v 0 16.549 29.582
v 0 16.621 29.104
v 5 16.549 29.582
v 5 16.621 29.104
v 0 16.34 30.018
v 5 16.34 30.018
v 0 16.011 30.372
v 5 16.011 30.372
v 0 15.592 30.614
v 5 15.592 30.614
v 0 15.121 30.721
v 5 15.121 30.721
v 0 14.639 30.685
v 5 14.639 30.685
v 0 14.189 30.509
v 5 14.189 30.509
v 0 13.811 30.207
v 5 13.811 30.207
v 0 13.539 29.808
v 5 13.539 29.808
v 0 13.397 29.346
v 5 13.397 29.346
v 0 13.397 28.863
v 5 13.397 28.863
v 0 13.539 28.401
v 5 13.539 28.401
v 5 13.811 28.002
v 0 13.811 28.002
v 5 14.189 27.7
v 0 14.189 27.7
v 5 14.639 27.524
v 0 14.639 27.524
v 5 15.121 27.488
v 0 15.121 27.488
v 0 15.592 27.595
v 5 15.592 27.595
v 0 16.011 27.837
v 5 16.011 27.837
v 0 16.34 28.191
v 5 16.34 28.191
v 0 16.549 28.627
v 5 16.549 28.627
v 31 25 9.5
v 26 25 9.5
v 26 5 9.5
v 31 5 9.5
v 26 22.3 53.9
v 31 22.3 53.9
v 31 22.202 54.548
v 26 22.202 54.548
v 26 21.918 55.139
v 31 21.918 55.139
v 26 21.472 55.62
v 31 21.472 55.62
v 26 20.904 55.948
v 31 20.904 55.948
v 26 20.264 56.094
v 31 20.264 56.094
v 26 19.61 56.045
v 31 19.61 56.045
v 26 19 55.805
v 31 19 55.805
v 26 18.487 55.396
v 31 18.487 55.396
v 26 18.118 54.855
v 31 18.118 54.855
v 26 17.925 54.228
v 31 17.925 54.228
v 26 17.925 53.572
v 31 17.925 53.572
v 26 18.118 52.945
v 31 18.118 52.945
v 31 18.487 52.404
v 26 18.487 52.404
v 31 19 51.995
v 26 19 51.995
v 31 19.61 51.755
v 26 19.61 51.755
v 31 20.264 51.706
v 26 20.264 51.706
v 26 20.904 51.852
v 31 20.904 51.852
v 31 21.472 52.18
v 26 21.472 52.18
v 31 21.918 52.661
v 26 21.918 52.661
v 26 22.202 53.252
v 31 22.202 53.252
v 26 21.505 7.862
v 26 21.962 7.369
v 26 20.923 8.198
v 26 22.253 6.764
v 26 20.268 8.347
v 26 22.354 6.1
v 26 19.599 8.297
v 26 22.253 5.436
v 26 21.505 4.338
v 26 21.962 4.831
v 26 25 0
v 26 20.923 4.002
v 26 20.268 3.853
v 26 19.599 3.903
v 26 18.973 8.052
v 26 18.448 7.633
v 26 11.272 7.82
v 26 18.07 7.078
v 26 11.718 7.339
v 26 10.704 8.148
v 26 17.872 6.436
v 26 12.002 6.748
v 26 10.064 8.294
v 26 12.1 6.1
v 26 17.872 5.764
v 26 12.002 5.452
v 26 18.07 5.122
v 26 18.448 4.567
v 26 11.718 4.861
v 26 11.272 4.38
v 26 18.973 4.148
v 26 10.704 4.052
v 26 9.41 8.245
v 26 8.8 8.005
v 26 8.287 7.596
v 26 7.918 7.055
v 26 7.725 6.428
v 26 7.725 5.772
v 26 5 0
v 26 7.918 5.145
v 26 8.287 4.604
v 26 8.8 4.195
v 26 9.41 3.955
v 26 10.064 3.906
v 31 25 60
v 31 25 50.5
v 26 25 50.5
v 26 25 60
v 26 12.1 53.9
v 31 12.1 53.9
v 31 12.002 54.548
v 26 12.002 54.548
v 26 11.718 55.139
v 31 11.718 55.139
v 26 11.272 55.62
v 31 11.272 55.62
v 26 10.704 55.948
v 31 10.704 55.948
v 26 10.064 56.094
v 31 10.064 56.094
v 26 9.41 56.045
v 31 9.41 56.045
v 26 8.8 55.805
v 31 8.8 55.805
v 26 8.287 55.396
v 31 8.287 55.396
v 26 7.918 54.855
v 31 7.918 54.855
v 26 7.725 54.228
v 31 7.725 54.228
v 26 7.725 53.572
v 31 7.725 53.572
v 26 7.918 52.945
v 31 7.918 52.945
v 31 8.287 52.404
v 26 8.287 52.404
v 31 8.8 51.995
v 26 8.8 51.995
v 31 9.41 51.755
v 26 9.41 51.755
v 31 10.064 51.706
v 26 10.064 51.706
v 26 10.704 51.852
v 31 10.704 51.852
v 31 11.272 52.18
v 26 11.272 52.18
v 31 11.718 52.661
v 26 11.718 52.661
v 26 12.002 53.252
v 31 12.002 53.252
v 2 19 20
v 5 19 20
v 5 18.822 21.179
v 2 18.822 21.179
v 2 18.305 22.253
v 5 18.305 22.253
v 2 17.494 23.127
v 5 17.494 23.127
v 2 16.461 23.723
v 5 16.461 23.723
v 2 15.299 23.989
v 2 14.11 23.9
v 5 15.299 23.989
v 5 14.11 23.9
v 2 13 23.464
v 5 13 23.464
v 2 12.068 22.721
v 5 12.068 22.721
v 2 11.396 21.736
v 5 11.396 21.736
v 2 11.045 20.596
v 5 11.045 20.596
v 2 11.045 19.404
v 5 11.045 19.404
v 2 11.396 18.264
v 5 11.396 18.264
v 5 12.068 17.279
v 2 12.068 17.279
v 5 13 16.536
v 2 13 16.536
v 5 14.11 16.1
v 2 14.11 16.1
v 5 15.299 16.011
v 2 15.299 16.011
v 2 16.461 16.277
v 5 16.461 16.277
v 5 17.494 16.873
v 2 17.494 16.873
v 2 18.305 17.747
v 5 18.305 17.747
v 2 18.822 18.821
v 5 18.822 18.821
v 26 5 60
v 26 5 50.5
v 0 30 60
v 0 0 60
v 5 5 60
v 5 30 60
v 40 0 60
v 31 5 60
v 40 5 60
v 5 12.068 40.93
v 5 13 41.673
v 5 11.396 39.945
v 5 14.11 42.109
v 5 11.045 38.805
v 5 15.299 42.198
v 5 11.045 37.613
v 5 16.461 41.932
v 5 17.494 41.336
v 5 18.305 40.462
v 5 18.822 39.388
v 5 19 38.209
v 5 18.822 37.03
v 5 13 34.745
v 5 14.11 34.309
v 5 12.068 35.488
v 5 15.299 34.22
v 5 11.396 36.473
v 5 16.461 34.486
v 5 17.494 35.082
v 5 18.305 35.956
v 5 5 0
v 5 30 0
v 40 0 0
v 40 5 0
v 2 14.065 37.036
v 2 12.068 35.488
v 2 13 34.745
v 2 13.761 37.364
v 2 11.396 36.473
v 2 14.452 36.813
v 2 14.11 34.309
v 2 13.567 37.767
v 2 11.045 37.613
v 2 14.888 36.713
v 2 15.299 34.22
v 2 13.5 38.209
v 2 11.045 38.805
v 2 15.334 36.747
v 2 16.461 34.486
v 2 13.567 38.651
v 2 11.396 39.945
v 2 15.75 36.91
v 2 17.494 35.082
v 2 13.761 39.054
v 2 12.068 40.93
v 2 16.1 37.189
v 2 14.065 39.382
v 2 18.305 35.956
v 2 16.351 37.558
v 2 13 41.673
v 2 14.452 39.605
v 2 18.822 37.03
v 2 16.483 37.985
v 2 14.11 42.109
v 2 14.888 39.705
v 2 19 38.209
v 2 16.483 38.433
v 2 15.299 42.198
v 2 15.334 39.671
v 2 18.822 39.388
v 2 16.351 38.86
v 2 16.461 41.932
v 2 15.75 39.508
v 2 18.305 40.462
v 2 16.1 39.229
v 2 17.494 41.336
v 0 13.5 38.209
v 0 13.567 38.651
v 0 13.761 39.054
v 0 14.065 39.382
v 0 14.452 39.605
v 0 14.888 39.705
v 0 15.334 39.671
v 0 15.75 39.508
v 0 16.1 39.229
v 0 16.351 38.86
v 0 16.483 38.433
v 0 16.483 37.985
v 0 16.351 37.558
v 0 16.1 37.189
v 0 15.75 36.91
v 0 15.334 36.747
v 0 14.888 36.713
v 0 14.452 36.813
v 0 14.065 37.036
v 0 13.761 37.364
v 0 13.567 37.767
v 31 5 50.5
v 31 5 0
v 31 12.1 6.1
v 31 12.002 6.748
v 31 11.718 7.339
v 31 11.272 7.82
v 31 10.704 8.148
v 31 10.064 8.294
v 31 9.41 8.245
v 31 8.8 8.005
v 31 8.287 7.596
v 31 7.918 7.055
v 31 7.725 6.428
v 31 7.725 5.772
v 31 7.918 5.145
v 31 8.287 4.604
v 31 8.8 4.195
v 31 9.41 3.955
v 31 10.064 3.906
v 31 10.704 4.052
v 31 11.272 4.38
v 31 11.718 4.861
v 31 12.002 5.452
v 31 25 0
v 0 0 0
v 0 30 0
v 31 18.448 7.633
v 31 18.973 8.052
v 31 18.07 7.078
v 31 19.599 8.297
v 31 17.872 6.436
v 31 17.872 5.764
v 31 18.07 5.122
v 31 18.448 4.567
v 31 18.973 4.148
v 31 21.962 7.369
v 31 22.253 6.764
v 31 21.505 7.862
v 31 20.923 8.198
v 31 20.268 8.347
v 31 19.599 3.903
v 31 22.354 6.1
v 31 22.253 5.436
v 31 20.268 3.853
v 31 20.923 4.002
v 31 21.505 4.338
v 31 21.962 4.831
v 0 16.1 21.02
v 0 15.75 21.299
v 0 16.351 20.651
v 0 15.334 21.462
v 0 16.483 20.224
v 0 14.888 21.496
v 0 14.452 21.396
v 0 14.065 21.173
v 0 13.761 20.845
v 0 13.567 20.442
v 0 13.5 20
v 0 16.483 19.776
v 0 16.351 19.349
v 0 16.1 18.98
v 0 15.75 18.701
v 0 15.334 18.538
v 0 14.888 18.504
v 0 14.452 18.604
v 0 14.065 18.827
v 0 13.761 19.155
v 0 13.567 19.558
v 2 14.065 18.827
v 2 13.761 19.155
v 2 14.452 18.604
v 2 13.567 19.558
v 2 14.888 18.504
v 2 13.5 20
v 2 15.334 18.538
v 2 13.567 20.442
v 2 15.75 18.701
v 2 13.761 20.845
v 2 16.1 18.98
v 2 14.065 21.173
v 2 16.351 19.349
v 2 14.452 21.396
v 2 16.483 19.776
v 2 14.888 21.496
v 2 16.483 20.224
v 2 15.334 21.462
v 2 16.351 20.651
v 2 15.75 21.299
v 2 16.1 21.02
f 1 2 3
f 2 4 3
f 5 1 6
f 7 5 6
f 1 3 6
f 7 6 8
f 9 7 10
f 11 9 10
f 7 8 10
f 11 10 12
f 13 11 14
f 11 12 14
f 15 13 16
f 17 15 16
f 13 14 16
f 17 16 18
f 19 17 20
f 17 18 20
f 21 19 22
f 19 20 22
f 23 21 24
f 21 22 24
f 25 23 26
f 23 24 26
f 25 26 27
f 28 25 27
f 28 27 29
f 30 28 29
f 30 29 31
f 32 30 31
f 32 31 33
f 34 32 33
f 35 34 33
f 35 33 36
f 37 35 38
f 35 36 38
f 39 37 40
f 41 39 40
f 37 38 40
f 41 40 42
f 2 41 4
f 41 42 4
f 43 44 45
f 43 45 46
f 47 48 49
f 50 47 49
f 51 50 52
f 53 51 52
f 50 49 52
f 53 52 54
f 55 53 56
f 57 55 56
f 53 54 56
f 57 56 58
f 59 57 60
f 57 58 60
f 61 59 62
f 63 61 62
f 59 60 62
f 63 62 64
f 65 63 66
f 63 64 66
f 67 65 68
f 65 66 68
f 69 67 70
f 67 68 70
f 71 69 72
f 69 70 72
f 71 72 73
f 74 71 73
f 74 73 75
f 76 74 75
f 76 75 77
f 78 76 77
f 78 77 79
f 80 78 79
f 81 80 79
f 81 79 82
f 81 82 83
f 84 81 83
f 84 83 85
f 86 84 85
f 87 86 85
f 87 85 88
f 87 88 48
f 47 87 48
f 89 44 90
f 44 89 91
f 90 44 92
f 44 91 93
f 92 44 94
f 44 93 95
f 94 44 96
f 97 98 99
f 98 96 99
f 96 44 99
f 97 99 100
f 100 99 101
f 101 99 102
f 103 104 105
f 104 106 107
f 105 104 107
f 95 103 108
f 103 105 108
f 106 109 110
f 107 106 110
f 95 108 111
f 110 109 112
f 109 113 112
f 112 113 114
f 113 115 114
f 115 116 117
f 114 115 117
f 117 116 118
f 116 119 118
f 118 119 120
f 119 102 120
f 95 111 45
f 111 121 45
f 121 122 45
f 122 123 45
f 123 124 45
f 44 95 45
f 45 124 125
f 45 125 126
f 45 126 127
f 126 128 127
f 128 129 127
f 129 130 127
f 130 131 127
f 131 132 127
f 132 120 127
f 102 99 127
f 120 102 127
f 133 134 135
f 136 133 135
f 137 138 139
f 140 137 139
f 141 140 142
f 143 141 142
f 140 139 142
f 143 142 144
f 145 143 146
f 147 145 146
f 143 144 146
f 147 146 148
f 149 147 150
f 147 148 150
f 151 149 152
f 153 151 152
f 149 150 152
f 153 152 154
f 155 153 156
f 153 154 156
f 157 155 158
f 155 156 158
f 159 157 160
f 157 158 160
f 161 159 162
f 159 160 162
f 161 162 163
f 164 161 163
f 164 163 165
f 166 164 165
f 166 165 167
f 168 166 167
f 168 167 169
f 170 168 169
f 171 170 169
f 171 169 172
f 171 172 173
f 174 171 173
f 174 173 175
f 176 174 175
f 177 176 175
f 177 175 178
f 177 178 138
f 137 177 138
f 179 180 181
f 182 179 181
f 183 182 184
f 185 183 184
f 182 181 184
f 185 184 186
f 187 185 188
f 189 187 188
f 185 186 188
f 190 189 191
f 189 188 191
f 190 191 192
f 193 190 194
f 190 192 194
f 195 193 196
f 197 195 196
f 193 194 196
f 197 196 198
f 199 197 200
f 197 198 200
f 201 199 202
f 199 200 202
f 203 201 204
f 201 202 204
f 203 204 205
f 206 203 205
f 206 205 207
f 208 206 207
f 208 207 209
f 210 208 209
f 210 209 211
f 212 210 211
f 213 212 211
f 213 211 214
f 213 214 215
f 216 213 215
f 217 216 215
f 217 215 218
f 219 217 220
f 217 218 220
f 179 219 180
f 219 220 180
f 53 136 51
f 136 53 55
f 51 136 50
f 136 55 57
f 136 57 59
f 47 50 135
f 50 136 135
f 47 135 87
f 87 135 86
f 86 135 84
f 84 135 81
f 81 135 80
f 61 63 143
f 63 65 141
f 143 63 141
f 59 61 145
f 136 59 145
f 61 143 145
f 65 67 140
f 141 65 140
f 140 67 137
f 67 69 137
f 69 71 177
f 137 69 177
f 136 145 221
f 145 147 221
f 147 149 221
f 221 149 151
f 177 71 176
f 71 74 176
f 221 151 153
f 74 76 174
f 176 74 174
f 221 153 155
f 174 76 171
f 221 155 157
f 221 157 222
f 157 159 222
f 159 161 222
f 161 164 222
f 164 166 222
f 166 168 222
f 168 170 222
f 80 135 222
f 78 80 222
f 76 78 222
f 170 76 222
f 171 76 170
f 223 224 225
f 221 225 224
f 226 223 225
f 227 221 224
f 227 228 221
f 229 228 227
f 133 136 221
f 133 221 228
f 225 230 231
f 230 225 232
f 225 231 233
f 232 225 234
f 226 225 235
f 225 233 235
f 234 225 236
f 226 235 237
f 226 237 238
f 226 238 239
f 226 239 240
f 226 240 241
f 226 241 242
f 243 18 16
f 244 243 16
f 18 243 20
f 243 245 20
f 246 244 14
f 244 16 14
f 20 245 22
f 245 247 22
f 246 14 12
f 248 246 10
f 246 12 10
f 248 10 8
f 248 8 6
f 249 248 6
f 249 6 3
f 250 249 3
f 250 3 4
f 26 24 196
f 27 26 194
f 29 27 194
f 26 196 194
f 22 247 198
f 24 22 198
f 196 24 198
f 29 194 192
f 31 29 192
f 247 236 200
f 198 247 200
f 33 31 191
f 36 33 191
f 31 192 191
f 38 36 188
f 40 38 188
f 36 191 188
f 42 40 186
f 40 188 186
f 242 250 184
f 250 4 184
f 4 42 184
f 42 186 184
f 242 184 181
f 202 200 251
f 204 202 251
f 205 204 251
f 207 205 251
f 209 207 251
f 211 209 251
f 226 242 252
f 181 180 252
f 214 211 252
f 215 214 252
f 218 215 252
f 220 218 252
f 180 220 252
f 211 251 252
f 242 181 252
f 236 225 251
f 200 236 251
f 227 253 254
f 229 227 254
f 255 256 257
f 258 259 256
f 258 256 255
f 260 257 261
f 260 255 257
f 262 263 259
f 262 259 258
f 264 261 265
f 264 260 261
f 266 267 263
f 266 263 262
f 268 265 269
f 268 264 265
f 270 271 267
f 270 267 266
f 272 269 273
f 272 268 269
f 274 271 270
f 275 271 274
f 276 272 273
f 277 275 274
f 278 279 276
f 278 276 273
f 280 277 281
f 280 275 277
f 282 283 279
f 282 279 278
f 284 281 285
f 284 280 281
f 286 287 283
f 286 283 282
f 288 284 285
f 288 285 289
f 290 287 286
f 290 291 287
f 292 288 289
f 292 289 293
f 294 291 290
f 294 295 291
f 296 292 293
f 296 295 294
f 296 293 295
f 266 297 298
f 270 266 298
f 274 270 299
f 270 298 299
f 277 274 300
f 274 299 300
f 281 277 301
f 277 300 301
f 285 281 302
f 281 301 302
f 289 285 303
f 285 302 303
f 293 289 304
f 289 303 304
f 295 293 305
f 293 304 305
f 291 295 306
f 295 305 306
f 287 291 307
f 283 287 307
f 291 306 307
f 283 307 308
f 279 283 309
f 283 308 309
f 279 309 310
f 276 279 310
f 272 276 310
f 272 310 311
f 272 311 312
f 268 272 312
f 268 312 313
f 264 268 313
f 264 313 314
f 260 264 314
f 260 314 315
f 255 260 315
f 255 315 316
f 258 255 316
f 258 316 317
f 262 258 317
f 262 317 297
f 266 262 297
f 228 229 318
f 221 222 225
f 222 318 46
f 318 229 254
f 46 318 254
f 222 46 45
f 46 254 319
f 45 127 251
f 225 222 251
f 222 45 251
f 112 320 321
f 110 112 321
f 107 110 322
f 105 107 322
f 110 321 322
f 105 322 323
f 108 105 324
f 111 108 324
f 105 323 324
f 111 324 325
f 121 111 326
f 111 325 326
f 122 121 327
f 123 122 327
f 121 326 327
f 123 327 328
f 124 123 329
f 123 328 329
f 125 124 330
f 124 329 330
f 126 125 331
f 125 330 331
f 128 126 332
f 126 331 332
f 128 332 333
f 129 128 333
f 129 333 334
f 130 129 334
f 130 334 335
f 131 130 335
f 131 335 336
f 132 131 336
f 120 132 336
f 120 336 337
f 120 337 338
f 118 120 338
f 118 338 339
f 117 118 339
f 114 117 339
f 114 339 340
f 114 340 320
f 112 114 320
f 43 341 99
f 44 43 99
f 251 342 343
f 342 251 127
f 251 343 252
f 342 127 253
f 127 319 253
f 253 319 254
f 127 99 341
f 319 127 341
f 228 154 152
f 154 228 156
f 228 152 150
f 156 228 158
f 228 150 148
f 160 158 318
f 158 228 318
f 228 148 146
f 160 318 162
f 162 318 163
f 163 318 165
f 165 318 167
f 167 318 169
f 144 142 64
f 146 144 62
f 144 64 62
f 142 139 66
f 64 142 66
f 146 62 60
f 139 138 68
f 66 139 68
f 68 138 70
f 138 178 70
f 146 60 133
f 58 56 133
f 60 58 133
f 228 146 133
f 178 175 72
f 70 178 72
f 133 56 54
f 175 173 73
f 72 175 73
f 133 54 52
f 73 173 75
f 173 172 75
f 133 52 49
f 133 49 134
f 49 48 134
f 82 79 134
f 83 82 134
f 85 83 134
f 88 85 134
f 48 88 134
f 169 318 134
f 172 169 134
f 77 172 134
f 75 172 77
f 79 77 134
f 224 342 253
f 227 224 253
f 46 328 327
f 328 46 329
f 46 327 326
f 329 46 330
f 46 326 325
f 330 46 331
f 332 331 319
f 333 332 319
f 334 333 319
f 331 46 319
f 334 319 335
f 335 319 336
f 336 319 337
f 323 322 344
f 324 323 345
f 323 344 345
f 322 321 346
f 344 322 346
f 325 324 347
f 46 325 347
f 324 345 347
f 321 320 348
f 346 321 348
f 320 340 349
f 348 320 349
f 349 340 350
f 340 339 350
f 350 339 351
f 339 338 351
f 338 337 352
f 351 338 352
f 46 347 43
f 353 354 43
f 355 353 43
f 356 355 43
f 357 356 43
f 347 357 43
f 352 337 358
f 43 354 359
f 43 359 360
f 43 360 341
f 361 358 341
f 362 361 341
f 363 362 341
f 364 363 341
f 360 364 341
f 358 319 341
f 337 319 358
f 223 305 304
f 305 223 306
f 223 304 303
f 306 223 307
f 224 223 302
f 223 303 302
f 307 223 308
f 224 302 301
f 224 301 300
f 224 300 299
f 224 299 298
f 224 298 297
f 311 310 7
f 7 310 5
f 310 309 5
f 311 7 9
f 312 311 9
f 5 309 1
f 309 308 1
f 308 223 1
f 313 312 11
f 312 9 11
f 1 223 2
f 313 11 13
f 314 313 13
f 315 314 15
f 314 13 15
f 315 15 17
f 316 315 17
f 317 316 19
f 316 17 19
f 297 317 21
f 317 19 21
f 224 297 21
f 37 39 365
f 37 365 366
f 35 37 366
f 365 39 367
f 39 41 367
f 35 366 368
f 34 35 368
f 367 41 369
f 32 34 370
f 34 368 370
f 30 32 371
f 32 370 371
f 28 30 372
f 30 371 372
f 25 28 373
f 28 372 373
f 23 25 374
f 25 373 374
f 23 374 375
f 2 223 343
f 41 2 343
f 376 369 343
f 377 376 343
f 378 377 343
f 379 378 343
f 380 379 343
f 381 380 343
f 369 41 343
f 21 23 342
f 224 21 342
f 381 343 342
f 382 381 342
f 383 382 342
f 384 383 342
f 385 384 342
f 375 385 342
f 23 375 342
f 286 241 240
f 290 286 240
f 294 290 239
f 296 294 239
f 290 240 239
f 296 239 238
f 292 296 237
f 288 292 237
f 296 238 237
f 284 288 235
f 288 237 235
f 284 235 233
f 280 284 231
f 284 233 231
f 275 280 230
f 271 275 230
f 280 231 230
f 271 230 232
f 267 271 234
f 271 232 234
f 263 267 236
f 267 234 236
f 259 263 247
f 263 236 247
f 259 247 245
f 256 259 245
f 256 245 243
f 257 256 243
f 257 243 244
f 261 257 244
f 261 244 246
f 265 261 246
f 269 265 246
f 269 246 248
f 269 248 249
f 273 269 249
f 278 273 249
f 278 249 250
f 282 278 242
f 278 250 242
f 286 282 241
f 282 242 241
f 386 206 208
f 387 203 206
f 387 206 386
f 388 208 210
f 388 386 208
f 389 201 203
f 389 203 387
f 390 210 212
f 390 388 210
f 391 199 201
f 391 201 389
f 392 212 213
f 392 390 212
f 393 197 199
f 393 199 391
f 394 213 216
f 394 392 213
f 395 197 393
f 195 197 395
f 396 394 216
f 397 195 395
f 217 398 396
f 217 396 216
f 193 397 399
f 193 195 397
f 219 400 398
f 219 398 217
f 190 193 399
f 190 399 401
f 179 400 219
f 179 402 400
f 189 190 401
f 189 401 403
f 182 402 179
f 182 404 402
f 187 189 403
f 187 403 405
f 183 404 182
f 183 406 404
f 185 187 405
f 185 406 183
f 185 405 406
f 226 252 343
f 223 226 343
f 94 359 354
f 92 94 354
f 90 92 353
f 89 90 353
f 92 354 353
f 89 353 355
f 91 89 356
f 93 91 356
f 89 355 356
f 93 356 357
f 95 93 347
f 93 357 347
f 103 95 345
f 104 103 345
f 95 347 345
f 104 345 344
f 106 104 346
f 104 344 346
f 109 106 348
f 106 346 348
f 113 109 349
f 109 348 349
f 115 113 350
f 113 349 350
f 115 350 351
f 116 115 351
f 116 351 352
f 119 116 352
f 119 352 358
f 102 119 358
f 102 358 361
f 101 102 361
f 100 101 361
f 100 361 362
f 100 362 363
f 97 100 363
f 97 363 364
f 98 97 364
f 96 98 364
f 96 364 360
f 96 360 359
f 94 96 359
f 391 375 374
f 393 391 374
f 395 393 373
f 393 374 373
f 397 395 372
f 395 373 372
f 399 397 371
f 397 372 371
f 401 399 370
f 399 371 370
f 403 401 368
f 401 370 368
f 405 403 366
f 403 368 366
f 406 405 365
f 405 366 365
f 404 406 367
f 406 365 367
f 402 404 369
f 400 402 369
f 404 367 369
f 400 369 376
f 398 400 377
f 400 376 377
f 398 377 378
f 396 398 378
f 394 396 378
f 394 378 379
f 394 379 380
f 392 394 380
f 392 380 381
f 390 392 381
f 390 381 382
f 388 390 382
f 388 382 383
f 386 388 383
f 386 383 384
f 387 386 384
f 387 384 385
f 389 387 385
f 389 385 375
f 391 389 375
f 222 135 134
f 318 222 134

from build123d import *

# Parameters (mm, degrees)
SALIENTE_EXTRUIR1_DEPTH = 60
CROQUIS2_W              = 5
CROQUIS2_H              = 41
CORTAR_EXTRUIR1_DEPTH   = 20
CROQUIS7_R              = 2.2
CROQUIS7_R_2            = 2.253524607
CORTAR_EXTRUIR5_DEPTH   = 10
CROQUIS8_R              = 1.5
CORTAR_EXTRUIR6_DEPTH   = 10
CROQUIS9_R              = 4
CROQUIS9_R_2            = 1.621314805
CORTAR_EXTRUIR7_DEPTH   = 3
CROQUIS10_R             = 1.621314805
CORTAR_EXTRUIR8_DEPTH   = 10


with BuildPart() as part:
    # Croquis1 → Saliente-Extruir1 (new body)
    with BuildSketch(Plane.XY):
        Polygon((0, 0), (40, 0), (40, 5), (31, 5), (31, 25), (26, 25), (26, 5), (5, 5), (5, 30), (0, 30), align=None)
    extrude(amount=SALIENTE_EXTRUIR1_DEPTH)

    # Croquis2 → Cortar-Extruir1 (cut)
    with BuildSketch(Plane(origin=(0, 25, 0), x_dir=(1, 0, 0), z_dir=(0, 1, 0))):
        with Locations((28.5, -30)):
            Rectangle(CROQUIS2_W, CROQUIS2_H)
    extrude(amount=-CORTAR_EXTRUIR1_DEPTH, mode=Mode.SUBTRACT)

    # Croquis7 → Cortar-Extruir5 (cut)
    with BuildSketch(Plane(origin=(31, 0, 0), x_dir=(0, 0, -1), z_dir=(1, 0, 0))):
        with Locations(Location((-53.9, 20.1, 0), (0, 0, 90))):
            Circle(CROQUIS7_R)
        with Locations(Location((-53.9, 9.9, 0), (0, 0, 90))):
            Circle(CROQUIS7_R)
        with Locations(Location((-6.1, 9.9, 0), (0, 0, 90))):
            Circle(CROQUIS7_R)
        with Locations(Location((-6.1, 20.1, 0), (0, 0, 90))):
            Circle(CROQUIS7_R_2)
    extrude(amount=-CORTAR_EXTRUIR5_DEPTH, mode=Mode.SUBTRACT)

    # Croquis8 → Cortar-Extruir6 (cut)
    with BuildSketch(Plane.ZY):
        with Locations(Location((20, 15, 0), (0, 0, 270))):
            Circle(CROQUIS8_R)
        with Locations(Location((38.208996139, 15, 0), (0, 0, 270))):
            Circle(CROQUIS8_R)
    extrude(amount=-CORTAR_EXTRUIR6_DEPTH, mode=Mode.SUBTRACT)

    # Croquis9 → Cortar-Extruir7 (cut)
    with BuildSketch(Plane(origin=(5, 0, 0), x_dir=(0, 0, -1), z_dir=(1, 0, 0))):
        with Locations(Location((-20, 15, 0), (0, 0, 90))):
            Circle(CROQUIS9_R)
        with Locations(Location((-29.104498069, 15, 0), (0, 0, 90))):
            Circle(CROQUIS9_R_2)
        with Locations(Location((-38.208996139, 15, 0), (0, 0, 90))):
            Circle(CROQUIS9_R)
    extrude(amount=-CORTAR_EXTRUIR7_DEPTH, mode=Mode.SUBTRACT)

    # Croquis10 → Cortar-Extruir8 (cut)
    with BuildSketch(Plane(origin=(2, 0, 0), x_dir=(0, 0, -1), z_dir=(1, 0, 0))):
        with Locations(Location((-29.104498069, 15, 0), (0, 0, 90))):
            Circle(CROQUIS10_R)
    extrude(amount=-CORTAR_EXTRUIR8_DEPTH, mode=Mode.SUBTRACT)


solid = part.part
